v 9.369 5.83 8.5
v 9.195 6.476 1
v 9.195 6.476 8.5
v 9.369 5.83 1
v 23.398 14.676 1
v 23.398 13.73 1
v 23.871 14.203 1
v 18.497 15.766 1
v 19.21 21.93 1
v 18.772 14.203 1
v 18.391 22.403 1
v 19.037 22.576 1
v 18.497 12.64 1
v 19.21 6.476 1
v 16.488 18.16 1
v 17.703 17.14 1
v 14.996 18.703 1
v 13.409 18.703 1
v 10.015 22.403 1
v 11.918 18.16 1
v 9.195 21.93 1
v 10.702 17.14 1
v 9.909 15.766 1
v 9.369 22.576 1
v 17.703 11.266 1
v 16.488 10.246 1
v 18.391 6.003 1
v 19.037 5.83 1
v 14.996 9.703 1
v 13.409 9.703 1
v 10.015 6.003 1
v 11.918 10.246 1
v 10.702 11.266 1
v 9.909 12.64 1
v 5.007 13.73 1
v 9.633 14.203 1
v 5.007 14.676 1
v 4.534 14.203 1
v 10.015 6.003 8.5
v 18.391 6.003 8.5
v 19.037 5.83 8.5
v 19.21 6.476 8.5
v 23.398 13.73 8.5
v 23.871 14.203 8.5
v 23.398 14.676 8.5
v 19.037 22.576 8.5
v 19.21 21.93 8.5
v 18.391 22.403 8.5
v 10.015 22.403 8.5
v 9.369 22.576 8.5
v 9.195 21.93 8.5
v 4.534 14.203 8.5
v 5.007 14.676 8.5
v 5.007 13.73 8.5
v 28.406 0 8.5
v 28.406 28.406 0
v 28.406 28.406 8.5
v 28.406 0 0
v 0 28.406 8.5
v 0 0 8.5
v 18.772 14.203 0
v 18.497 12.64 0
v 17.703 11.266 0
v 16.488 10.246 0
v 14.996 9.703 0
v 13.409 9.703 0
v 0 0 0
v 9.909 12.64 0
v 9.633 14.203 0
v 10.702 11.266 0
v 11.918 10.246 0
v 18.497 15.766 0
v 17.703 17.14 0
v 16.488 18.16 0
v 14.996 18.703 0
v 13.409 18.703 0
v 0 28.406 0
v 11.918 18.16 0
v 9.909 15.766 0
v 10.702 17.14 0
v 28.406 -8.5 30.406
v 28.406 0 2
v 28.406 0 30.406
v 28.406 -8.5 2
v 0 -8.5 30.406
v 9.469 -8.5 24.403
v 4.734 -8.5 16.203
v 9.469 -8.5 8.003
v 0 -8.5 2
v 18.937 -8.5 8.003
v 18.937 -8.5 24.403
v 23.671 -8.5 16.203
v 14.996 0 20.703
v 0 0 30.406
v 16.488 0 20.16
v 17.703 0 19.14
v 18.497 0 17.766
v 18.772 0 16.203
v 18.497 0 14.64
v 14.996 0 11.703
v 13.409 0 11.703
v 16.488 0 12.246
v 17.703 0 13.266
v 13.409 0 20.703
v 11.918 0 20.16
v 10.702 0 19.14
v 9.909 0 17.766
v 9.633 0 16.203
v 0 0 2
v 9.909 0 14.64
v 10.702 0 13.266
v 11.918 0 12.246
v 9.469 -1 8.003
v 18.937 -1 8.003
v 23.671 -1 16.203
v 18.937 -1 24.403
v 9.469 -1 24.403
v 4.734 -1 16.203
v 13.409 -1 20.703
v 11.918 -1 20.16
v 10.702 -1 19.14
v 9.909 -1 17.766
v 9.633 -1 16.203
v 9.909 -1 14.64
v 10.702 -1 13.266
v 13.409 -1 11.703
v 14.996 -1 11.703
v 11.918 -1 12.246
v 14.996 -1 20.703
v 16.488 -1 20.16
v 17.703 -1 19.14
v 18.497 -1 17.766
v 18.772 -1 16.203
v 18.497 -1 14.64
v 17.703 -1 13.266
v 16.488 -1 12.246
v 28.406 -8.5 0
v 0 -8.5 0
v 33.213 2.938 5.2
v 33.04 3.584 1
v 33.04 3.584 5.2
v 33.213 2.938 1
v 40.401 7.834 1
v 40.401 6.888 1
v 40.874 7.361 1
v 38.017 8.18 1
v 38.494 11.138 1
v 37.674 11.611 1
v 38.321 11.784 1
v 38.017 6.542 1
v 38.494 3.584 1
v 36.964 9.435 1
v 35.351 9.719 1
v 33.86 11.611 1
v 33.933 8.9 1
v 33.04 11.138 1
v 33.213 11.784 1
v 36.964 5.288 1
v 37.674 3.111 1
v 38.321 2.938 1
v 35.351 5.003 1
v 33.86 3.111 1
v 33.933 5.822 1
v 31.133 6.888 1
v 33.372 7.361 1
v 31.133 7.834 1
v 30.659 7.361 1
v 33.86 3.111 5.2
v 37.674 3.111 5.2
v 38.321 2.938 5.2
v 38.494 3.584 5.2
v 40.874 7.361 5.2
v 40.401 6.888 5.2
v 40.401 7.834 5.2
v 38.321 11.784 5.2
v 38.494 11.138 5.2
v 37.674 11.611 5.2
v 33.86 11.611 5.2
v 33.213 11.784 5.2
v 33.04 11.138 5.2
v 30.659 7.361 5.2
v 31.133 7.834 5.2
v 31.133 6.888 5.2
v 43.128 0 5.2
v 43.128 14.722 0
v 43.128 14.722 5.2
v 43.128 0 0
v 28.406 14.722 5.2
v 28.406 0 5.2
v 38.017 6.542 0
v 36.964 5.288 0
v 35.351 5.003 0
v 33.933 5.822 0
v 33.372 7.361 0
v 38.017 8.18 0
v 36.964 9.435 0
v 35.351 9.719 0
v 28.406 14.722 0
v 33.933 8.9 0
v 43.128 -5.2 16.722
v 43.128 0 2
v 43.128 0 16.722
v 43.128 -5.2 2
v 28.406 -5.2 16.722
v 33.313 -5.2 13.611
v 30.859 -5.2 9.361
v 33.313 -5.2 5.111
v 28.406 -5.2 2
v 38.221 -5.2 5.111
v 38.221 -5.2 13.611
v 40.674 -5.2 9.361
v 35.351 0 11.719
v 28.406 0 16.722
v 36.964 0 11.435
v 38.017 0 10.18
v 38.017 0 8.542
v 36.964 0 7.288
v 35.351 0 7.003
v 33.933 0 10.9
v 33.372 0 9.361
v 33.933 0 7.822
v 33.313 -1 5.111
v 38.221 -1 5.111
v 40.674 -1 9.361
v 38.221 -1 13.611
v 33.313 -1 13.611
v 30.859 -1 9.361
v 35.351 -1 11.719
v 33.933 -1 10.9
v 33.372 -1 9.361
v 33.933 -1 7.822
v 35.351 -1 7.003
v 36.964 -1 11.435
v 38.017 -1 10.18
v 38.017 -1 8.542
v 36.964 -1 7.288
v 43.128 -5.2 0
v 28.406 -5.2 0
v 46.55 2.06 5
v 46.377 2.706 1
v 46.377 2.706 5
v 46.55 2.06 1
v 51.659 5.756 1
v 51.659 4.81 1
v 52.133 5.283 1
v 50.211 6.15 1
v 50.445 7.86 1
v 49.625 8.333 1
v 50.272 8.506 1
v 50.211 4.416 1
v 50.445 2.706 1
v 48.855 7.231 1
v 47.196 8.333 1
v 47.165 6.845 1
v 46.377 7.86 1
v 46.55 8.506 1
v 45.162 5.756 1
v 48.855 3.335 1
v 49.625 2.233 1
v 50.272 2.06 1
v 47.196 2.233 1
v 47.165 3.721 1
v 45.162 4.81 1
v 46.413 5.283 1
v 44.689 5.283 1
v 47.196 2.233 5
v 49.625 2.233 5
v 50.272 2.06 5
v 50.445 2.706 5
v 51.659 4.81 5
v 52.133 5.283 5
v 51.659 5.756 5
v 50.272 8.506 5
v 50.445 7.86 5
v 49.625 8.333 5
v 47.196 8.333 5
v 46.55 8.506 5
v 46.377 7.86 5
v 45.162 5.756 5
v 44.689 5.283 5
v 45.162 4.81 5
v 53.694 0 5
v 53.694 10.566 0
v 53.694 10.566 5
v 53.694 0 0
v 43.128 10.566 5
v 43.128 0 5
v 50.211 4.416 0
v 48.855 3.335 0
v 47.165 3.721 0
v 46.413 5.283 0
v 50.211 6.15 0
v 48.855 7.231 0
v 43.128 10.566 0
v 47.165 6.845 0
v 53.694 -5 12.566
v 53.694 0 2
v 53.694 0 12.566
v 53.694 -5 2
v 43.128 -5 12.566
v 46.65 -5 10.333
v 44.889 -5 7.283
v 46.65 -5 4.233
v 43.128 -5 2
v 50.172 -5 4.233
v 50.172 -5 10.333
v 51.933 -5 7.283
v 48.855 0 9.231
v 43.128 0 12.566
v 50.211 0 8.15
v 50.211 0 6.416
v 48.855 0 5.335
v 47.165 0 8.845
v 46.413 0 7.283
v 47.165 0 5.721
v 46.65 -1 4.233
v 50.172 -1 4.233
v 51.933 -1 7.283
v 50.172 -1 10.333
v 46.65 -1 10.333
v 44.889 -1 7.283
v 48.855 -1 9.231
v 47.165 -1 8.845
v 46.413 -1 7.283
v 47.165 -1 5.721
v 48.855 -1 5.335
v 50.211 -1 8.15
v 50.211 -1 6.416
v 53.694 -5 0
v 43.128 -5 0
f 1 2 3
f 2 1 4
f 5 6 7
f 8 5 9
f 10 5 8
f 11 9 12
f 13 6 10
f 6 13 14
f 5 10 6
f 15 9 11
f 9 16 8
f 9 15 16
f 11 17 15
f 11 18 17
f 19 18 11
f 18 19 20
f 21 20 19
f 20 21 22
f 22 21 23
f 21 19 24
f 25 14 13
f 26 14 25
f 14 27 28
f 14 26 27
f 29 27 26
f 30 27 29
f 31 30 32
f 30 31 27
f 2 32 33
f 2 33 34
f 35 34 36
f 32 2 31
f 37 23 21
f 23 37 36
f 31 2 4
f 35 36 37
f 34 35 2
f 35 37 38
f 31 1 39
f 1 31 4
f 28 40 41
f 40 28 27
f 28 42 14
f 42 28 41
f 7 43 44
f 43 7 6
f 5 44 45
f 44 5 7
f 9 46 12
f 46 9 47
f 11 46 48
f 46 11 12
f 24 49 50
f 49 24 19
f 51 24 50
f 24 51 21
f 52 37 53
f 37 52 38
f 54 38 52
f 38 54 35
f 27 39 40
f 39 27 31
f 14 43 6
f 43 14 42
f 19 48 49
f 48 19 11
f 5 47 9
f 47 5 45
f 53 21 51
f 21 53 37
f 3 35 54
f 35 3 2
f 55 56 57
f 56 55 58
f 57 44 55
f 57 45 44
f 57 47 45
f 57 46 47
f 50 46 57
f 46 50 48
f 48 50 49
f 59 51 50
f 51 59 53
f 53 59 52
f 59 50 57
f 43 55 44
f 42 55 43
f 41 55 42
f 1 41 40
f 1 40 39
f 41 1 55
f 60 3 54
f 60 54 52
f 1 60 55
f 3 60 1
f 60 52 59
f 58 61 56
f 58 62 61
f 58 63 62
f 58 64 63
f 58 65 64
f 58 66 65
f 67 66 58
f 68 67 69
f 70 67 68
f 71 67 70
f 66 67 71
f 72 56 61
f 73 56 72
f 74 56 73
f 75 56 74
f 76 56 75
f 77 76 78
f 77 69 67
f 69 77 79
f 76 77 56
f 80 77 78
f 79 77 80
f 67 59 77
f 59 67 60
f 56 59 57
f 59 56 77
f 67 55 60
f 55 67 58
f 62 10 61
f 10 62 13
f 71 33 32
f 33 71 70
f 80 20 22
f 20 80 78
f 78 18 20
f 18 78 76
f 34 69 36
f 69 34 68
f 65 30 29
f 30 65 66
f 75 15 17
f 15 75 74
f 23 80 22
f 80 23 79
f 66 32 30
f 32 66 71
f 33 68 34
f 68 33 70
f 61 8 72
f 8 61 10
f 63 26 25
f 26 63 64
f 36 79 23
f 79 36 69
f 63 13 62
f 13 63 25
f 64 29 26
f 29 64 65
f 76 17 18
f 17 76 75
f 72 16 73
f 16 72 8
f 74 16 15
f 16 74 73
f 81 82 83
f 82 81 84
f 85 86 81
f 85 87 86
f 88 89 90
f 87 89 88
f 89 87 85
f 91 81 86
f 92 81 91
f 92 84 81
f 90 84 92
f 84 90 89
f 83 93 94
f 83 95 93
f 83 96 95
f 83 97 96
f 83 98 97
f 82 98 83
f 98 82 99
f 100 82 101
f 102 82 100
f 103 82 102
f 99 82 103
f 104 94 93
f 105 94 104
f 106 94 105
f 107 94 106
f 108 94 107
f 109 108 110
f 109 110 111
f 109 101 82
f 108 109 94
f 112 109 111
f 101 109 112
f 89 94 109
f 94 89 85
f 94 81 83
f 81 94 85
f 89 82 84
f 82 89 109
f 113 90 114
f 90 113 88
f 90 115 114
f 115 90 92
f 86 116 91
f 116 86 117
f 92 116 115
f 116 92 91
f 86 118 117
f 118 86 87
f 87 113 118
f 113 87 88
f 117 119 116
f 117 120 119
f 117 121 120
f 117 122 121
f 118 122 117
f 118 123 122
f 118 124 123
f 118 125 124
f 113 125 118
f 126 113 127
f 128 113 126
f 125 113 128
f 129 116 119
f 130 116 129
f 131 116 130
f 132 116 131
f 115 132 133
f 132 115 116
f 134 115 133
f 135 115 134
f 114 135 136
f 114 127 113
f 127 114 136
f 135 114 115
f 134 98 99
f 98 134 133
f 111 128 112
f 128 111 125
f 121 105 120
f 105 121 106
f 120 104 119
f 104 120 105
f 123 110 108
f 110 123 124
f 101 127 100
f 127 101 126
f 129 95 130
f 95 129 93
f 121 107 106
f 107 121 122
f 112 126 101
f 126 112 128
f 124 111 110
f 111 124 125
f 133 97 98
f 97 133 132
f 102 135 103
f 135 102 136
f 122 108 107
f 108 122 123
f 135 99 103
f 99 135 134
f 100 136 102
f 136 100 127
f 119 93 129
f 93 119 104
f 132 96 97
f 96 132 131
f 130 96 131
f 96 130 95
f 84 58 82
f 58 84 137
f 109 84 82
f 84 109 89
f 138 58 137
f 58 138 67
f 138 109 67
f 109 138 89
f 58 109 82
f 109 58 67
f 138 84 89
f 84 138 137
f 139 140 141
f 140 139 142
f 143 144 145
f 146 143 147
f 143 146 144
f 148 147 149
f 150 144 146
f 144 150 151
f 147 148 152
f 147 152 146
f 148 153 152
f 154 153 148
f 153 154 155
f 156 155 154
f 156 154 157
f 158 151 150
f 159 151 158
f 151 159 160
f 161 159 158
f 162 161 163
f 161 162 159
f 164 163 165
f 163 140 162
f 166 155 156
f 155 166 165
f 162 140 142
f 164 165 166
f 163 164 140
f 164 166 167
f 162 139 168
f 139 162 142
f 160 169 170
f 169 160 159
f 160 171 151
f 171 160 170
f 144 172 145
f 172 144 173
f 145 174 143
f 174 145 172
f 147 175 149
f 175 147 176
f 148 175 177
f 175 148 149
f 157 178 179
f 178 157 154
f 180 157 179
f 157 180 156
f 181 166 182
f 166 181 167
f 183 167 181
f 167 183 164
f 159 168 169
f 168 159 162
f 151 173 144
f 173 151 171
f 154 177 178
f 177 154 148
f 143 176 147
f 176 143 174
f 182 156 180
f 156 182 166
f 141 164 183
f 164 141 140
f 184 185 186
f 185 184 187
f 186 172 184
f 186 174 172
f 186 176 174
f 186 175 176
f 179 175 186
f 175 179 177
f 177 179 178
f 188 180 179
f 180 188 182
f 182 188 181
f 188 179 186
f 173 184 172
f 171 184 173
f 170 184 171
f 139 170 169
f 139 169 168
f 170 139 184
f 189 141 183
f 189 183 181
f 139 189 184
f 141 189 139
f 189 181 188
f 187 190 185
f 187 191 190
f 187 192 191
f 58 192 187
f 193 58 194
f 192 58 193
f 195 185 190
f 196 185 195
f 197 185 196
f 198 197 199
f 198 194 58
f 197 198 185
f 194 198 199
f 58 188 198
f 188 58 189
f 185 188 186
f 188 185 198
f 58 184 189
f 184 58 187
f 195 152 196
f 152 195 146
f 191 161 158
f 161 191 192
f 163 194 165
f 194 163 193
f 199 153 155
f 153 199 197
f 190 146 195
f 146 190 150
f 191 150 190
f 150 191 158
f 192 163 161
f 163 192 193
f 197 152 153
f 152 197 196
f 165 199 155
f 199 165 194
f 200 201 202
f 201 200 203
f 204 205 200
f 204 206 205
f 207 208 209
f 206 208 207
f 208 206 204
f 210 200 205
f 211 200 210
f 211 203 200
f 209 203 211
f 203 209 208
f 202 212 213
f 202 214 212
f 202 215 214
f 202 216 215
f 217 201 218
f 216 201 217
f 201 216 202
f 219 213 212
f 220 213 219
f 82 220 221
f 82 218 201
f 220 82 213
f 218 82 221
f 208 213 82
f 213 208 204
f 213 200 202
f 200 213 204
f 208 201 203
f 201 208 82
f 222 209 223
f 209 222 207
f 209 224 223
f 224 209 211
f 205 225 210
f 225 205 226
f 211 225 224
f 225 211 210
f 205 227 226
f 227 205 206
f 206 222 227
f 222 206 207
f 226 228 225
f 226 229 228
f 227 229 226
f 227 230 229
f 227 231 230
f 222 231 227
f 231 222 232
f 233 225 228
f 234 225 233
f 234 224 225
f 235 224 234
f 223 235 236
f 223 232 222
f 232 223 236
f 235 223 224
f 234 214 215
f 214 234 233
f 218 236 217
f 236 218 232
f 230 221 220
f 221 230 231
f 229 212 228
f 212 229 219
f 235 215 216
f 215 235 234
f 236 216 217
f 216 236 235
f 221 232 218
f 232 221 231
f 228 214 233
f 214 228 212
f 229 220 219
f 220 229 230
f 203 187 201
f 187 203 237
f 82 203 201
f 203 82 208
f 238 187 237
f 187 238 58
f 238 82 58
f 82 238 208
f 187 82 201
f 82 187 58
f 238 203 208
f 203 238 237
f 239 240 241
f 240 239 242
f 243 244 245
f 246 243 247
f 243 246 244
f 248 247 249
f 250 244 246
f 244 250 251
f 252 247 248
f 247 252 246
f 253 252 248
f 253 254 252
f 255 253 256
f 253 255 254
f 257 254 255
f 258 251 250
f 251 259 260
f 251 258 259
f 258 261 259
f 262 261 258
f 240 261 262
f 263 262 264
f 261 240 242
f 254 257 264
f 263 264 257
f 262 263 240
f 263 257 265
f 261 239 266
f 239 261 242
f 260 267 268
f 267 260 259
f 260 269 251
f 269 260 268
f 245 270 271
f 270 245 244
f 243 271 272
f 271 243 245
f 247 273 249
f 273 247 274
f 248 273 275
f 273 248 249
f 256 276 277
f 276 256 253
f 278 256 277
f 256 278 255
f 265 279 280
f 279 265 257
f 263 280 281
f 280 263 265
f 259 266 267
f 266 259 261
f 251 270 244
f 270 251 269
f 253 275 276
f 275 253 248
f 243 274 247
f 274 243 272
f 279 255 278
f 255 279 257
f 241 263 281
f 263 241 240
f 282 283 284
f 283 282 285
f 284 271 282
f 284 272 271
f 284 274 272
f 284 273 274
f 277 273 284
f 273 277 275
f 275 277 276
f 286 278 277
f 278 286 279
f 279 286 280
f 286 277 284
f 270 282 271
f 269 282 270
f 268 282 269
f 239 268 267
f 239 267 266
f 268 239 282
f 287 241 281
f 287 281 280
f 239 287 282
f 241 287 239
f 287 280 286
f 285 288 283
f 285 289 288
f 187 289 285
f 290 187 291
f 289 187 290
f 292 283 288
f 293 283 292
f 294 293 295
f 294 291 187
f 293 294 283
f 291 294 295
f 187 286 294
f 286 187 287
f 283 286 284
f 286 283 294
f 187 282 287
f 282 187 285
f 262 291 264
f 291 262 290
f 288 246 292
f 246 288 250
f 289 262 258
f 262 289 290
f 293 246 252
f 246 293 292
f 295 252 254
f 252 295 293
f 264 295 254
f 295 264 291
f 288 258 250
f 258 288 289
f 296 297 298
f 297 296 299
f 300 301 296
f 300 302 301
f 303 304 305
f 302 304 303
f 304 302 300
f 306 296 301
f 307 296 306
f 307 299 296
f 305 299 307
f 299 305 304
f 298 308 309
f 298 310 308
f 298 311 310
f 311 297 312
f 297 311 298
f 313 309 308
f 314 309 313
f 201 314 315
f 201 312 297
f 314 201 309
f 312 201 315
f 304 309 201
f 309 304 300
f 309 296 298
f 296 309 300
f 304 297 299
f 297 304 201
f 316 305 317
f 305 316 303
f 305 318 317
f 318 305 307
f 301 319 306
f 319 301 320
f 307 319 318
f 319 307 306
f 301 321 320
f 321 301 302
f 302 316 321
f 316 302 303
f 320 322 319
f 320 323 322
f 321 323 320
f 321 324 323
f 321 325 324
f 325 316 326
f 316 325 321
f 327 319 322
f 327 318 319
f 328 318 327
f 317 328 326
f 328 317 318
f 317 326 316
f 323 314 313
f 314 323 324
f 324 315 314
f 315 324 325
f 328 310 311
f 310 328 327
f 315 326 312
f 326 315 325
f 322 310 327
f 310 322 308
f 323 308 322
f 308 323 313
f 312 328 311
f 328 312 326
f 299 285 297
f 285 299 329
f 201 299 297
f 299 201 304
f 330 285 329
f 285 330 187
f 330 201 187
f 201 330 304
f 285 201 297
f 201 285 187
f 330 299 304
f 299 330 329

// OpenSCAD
// file: functions.scad
// PRUSA Mendel  
// Functions used in many files
// GNU GPL v2
// Josef Průša
// josefprusa@me.com
// prusadjs.cz
// http://www.reprap.org/wiki/Prusa_Mendel
// http://github.com/prusajr/PrusaMendel

module nut( d, h, horizontal = true )
{
	cornerdiameter = ( d / 2 ) / cos( 180 / 6 );
	cylinder( h = h, r = cornerdiameter, $fn = 6 );
	if( horizontal )
	{
		for( i = [1 : 6] )
		{
			rotate( [0, 0, 60 * i] ) translate( [-cornerdiameter - 0.2, 0, 0] ) rotate( [0, 0, -45] ) cube( size = [2, 2, h] );
		}
	}
}

// By nophead
module polyhole( d, h ) 
{
	n = max( round( 2 * d ), 3 );
	rotate( [0, 0, 180] ) cylinder( h = h, r = ( d / 2 ) / cos( 180 / n ), $fn = n );
}

module roundcorner( diameter )
{
	difference()
	{
		cube( size = [diameter, diameter, 99], center = false );
		translate( v = [diameter, diameter, 0] ) cylinder( h = 100, r = diameter, center = true );
	}
}
// file: metric.scad
// PRUSA Mendel  
// Default metric sizes
// GNU GPL v2
// Josef Průša
// josefprusa@me.com
// prusadjs.cz
// http://www.reprap.org/wiki/Prusa_Mendel
// http://github.com/prusajr/PrusaMendel

// DONT CHANGE THIS FILE! ALTER VALUES IN CONFIGURATION.SCAD INSTEAD

// RODS

threaded_rod_diameter = 8.2;
threaded_rod_diameter_horizontal = 8.2;
smooth_bar_diameter = 8;
smooth_bar_diameter_horizontal = 8.5;

// Nuts and bolts
// Nut diameters are flat to flat

m8_diameter = 9;
m8_nut_diameter = 16.4;
m8_nut_thickness = 6.5;

m4_diameter = 4.5;
m4_nut_diameter = 9;
m4_nut_thickness = 3.2;

m3_diameter = 3.6;
m3_nut_diameter = 6.1;
m3_nut_thickness = 2.4;

// Bushing holder

bushing_core_diameter = smooth_bar_diameter;
bushing_material_thickness = 1;

// Motors

motor_shaft = 5.5;
// file: configuration.scad
// PRUSA Mendel  
// Configuration file
// GNU GPL v2
// Josef Průša
// josefprusa@me.com
// prusadjs.cz
// http://www.reprap.org/wiki/Prusa_Mendel
// http://github.com/prusajr/PrusaMendel

// PLEASE SELECT ONE OF THE CONFIGURATIONS BELOW
// BY UN-COMMENTING IT

// Uncomment for metric settings
// METRIC METRIC METRIC METRIC METRIC METRIC METRIC METRIC 

include <metric.scad>;

// Uncomment for imperial settings
// IMPERIAL IMPERIAL IMPERIAL IMPERIAL IMPERIAL IMPERIAL IMPERIAL 

//include <sae.scad>;

// CUSTOM CUSTOM CUSTOM CUSTOM CUSTOM CUSTOM CUSTOM CUSTOM CUSTOM

// Thin walls
layer_height = 0.3;
wot = 1.5;
filament_width = layer_height * wot;

thin_wall = 4 * layer_height * wot;

// LM8UU
linear = true;
linear_bearing_diameter = 15;
linear_bearing_length = 24;

//608 bearing
bearing_diameter = 22;
bearing_thickness = 7;

//Timing belt
belt_pitch = 5;

// CHANGE ONLY THE STUFF YOU KNOW
// IT WILL REPLACE DEFAULT SETTING

// RODS

// threaded_rod_diameter = 0;
// threaded_rod_diameter_horizontal = 0;
// smooth_bar_díameter = 0;
// smooth_bar_díameter_horizontal = 0;

// Nuts and bolts

// m8_diameter = 0;
// m8_nut_diameter = 0;
// m8_nut_thickness = 0;

// m4_diameter = 0;
 m4_nut_diameter = 8.5;
// m4_nut_thickness = 0;

// m3_diameter = 0;
// m3_nut_diameter = 0;
m3_nut_thickness = 3;

// Bushing holder

// bushing_core_diameter = smooth_bar_díameter;
// bushing_material_thickness = 0;

///counted stuff
m3_nut_diameter_bigger = ( ( m3_nut_diameter  / 2) / cos( 180 / 6 ) ) * 2;

// functions 
include <functions.scad>
// main file
// PRUSA Mendel  
// Configuration test
// GNU GPL v2
// Josef Průša
// josefprusa@me.com
// prusadjs.cz
// http://www.reprap.org/wiki/Prusa_Mendel
// http://github.com/prusajr/PrusaMendel

include <configuration.scad>

/**
 * @id calibration
 * @name Configuration test
 */

//configurationtest();

nuttests();
//rotate([0,0,180]) 
//nutslottests();

module nuttests()
{	
	union()
	{
		nuttest(m8_diameter, m8_nut_diameter, m8_nut_thickness);
		translate([m8_nut_diameter/cos(30)*1.5,0,0]) 
			nuttest(m4_diameter, m4_nut_diameter, m4_nut_thickness);
		translate([(m8_nut_diameter+m4_nut_diameter)/cos(30)*1.5,0,0]) 
			nuttest(m3_diameter, m3_nut_diameter, m3_nut_thickness);
	}
}

module nutslottests()
{
	union()
	{
		nutslottest(m8_diameter, m8_nut_diameter, m8_nut_thickness);
		translate([m8_nut_diameter/cos(30)*1.5,0,0]) 
			nutslottest(m4_diameter, m4_nut_diameter, m4_nut_thickness);
		translate([(m8_nut_diameter+m4_nut_diameter)/cos(30)*1.5,0,0]) 
			nutslottest(m3_diameter, m3_nut_diameter, m3_nut_thickness);

	}
}

module nuttest(hole_d, nut_d, nut_t)
{
	union()
	{
		translate([nut_d/cos(30)*1.5/2,nut_d/cos(30)*1.5/2,(nut_t+2)/2]) nutrecess(hole_d, nut_d, nut_t, true);
		translate([nut_d/cos(30)*1.5/2,-(nut_t+2)/2,2+nut_d/cos(30)*1.5/2]) rotate([90,0,0]) nutrecess(hole_d, nut_d, nut_t, false);
		translate([0,-(nut_t+2),0])cube([nut_d/cos(30)*1.5,nut_t+2,2]);
	}
}

module nutslottest(hole_d, nut_d, nut_t)
{
	union()
	{
		translate([nut_d/cos(30)*1.5/2,nut_d/cos(30)*1.5/2,(nut_t+4)/2]) rotate([0,0,180])nutslot(hole_d, nut_d, nut_t, true);
		translate([nut_d/cos(30)*1.5/2,-(nut_t+2)/2,nut_d/cos(30)*1.5/2]) rotate([-90,0,0]) nutslot(hole_d, nut_d, nut_t, false);
	}
}

module nutrecess(hole_d, nut_d, nut_t, horizontal)
{
	translate([0,0,-nut_t/2])
	difference()
	{
		translate([0,0,nut_t/2]) cube([nut_d/cos(30)*1.5, nut_d/cos(30)*1.5, nut_t+2], center=true);
		nut(d=nut_d, h=nut_t+2, horizontal = horizontal);
		translate([0,0,-1.5]) polyhole(d=hole_d, h=nut_t+3);
	}
}

module nutslot(hole_d, nut_d, nut_t, horizontal)
{
	difference()
	{
		cube([nut_d/cos(30)*1.5, nut_d/cos(30)*1.5, nut_t+4], center=true);
		rotate([0,0,30])translate([0,0,-nut_t/2]) nut(d=nut_d, h=nut_t, horizontal = horizontal);
		translate([0,-nut_d,0])cube([nut_d, nut_d*2, nut_t], center=true);
	}
}

module configurationtest()
{
	difference()
	{
		union()
		{
			rotate( a = [0, 0, 30] ) cylinder( h = 10, r = ( m8_nut_diameter / 2 ) + 4, $fn = 6 );
			translate( v = [( ( ( m8_diameter / 2 ) + 3 ) * 2 + ( m3_diameter / 2 ) + 2 + ( ( ( m3_diameter / 2 ) + 2 ) * 2 ) / 2 ) / 2, 0,5] ) cube( size = [( ( m8_diameter / 2 ) + 3 ) * 2 + ( m3_diameter / 2 ) + 2 + ( ( ( m3_diameter / 2 ) + 2 ) * 2 ) / 2, ( ( m8_nut_diameter / 2 ) + 4 ) * 2, 10], center = true );

			translate( v = [( ( m8_diameter / 2 ) + 3 ), ( m8_nut_diameter / 2 ) + 2, ( ( m8_diameter ) + 15 ) / 2]) cube( size = [( ( m8_diameter / 2 ) + 3 ) * 2, 4, ( m8_diameter ) + 15], center = true );
			//translate( v = [( m8_diameter / 2 ) + 3, ( m8_nut_diameter / 2 ) + 4, ( m8_diameter / 2 ) + 10] ) rotate( a = [90, 0, 0] ) cylinder( h = 4, r = ( m8_diameter / 2 ) + 3 );

			translate( v = [( ( m8_diameter / 2 ) + 3 ) * 2 + ( m3_diameter / 2 ) + 1.9, ( m8_nut_diameter / 2 ) + 2, ( ( m8_diameter ) + 15 ) / 2] ) cube( size = [( ( m3_diameter / 2 ) + 2.1 ) * 2, 4, ( m8_diameter ) + 15], center = true);
			//translate( v = [( ( m8_diameter / 2 ) + 3 ) * 2 + ( m3_diameter / 2 ) + 2, ( m8_nut_diameter / 2 ) + 4, ( m8_diameter / 2 ) + 10] ) rotate( a = [90, 0, 0] ) cylinder( h = 4, r = ( m3_diameter / 2 ) + 2 );
		}
		translate( v = [( m8_diameter / 2 ) + 3, ( m8_nut_diameter / 2 ) + 5, ( m8_diameter / 2 ) + 10] ) rotate( a = [90, 0, 0] ) cylinder( h = 6, r = ( m8_diameter / 2 ) );
		translate( v = [( ( m8_diameter / 2 ) + 3 ) * 2 + ( m3_diameter / 2 ) + 2, ( m8_nut_diameter / 2 ) + 5, ( m8_diameter / 2 ) + 10] ) rotate( a = [90, 0, 0] ) cylinder( h = 6, r = ( m3_diameter / 2 ) );
		translate( v = [0, 0, -1] ) cylinder( h = 15, r = ( m8_diameter / 2 ) );
		translate( v = [( m8_nut_diameter / 2 ) + ( m3_nut_diameter / 2 ) + 2, 0, -1] ) cylinder( h = 15, r = ( m3_diameter / 2 ) );
		translate( v = [( m8_nut_diameter / 2 ) + ( m3_nut_diameter / 2 ) + 2, 0, 5] ) rotate( a = [0, 0, 30] ) cylinder( h = 15, r = ( m3_nut_diameter / 2 ), $fn = 6 );
		rotate( a = [0, 0, 30] ) translate( v = [0, 0, 5] ) cylinder( h = 15, r = ( m8_nut_diameter / 2 ), $fn = 6 );

		translate( v = [( ( m8_diameter / 2 ) + 3 ) * 2 + ( m3_diameter / 2 ) + 2 + ( ( ( m3_diameter / 2 ) + 2 ) * 2 ) / 2 - 4, 0, 0] ) rotate( a = [0, 0, -25] ) difference()
		{
		 	translate( v = [0, 0, -1] ) cube(size = [10, 10, 20] );
		 	rotate( a = [0, 0, 50] ) translate( v = [0, 0, -1.5] ) cube( size = [30, 30, 21] );
		}
	
		translate( v = [( ( m8_diameter / 2 ) + 3 ) * 2 + ( m3_diameter / 2 ) + 2 + ( ( ( m3_diameter / 2 ) + 2 ) * 2 ) / 2 - 4, -3.7, 0] ) rotate( a = [0, 0, -25] ) difference()
		{
	 		translate( v = [0, 0, -1] ) cube( size = [10, 10, 20] );
		 	rotate( a = [0, 0, 50] ) translate( v = [0, 0, -1.5] ) cube( size = [30, 30, 21] );
		}
	
		translate( v = [( ( m8_diameter / 2 ) + 3 ) * 2 + ( m3_diameter / 2 ) + 2 + ( ( ( m3_diameter / 2 ) + 2 ) * 2 ) / 2 - 4, 3.7, 0] ) rotate( a = [0, 0, -25] ) difference()
		{
		 	translate( v = [0, 0, -1] ) cube( size = [10, 10, 20] );
		 	rotate( a = [0, 0, 50] ) translate( v = [0, 0, -1.5] ) cube( size = [30, 30, 21] );
		}
	}
}
